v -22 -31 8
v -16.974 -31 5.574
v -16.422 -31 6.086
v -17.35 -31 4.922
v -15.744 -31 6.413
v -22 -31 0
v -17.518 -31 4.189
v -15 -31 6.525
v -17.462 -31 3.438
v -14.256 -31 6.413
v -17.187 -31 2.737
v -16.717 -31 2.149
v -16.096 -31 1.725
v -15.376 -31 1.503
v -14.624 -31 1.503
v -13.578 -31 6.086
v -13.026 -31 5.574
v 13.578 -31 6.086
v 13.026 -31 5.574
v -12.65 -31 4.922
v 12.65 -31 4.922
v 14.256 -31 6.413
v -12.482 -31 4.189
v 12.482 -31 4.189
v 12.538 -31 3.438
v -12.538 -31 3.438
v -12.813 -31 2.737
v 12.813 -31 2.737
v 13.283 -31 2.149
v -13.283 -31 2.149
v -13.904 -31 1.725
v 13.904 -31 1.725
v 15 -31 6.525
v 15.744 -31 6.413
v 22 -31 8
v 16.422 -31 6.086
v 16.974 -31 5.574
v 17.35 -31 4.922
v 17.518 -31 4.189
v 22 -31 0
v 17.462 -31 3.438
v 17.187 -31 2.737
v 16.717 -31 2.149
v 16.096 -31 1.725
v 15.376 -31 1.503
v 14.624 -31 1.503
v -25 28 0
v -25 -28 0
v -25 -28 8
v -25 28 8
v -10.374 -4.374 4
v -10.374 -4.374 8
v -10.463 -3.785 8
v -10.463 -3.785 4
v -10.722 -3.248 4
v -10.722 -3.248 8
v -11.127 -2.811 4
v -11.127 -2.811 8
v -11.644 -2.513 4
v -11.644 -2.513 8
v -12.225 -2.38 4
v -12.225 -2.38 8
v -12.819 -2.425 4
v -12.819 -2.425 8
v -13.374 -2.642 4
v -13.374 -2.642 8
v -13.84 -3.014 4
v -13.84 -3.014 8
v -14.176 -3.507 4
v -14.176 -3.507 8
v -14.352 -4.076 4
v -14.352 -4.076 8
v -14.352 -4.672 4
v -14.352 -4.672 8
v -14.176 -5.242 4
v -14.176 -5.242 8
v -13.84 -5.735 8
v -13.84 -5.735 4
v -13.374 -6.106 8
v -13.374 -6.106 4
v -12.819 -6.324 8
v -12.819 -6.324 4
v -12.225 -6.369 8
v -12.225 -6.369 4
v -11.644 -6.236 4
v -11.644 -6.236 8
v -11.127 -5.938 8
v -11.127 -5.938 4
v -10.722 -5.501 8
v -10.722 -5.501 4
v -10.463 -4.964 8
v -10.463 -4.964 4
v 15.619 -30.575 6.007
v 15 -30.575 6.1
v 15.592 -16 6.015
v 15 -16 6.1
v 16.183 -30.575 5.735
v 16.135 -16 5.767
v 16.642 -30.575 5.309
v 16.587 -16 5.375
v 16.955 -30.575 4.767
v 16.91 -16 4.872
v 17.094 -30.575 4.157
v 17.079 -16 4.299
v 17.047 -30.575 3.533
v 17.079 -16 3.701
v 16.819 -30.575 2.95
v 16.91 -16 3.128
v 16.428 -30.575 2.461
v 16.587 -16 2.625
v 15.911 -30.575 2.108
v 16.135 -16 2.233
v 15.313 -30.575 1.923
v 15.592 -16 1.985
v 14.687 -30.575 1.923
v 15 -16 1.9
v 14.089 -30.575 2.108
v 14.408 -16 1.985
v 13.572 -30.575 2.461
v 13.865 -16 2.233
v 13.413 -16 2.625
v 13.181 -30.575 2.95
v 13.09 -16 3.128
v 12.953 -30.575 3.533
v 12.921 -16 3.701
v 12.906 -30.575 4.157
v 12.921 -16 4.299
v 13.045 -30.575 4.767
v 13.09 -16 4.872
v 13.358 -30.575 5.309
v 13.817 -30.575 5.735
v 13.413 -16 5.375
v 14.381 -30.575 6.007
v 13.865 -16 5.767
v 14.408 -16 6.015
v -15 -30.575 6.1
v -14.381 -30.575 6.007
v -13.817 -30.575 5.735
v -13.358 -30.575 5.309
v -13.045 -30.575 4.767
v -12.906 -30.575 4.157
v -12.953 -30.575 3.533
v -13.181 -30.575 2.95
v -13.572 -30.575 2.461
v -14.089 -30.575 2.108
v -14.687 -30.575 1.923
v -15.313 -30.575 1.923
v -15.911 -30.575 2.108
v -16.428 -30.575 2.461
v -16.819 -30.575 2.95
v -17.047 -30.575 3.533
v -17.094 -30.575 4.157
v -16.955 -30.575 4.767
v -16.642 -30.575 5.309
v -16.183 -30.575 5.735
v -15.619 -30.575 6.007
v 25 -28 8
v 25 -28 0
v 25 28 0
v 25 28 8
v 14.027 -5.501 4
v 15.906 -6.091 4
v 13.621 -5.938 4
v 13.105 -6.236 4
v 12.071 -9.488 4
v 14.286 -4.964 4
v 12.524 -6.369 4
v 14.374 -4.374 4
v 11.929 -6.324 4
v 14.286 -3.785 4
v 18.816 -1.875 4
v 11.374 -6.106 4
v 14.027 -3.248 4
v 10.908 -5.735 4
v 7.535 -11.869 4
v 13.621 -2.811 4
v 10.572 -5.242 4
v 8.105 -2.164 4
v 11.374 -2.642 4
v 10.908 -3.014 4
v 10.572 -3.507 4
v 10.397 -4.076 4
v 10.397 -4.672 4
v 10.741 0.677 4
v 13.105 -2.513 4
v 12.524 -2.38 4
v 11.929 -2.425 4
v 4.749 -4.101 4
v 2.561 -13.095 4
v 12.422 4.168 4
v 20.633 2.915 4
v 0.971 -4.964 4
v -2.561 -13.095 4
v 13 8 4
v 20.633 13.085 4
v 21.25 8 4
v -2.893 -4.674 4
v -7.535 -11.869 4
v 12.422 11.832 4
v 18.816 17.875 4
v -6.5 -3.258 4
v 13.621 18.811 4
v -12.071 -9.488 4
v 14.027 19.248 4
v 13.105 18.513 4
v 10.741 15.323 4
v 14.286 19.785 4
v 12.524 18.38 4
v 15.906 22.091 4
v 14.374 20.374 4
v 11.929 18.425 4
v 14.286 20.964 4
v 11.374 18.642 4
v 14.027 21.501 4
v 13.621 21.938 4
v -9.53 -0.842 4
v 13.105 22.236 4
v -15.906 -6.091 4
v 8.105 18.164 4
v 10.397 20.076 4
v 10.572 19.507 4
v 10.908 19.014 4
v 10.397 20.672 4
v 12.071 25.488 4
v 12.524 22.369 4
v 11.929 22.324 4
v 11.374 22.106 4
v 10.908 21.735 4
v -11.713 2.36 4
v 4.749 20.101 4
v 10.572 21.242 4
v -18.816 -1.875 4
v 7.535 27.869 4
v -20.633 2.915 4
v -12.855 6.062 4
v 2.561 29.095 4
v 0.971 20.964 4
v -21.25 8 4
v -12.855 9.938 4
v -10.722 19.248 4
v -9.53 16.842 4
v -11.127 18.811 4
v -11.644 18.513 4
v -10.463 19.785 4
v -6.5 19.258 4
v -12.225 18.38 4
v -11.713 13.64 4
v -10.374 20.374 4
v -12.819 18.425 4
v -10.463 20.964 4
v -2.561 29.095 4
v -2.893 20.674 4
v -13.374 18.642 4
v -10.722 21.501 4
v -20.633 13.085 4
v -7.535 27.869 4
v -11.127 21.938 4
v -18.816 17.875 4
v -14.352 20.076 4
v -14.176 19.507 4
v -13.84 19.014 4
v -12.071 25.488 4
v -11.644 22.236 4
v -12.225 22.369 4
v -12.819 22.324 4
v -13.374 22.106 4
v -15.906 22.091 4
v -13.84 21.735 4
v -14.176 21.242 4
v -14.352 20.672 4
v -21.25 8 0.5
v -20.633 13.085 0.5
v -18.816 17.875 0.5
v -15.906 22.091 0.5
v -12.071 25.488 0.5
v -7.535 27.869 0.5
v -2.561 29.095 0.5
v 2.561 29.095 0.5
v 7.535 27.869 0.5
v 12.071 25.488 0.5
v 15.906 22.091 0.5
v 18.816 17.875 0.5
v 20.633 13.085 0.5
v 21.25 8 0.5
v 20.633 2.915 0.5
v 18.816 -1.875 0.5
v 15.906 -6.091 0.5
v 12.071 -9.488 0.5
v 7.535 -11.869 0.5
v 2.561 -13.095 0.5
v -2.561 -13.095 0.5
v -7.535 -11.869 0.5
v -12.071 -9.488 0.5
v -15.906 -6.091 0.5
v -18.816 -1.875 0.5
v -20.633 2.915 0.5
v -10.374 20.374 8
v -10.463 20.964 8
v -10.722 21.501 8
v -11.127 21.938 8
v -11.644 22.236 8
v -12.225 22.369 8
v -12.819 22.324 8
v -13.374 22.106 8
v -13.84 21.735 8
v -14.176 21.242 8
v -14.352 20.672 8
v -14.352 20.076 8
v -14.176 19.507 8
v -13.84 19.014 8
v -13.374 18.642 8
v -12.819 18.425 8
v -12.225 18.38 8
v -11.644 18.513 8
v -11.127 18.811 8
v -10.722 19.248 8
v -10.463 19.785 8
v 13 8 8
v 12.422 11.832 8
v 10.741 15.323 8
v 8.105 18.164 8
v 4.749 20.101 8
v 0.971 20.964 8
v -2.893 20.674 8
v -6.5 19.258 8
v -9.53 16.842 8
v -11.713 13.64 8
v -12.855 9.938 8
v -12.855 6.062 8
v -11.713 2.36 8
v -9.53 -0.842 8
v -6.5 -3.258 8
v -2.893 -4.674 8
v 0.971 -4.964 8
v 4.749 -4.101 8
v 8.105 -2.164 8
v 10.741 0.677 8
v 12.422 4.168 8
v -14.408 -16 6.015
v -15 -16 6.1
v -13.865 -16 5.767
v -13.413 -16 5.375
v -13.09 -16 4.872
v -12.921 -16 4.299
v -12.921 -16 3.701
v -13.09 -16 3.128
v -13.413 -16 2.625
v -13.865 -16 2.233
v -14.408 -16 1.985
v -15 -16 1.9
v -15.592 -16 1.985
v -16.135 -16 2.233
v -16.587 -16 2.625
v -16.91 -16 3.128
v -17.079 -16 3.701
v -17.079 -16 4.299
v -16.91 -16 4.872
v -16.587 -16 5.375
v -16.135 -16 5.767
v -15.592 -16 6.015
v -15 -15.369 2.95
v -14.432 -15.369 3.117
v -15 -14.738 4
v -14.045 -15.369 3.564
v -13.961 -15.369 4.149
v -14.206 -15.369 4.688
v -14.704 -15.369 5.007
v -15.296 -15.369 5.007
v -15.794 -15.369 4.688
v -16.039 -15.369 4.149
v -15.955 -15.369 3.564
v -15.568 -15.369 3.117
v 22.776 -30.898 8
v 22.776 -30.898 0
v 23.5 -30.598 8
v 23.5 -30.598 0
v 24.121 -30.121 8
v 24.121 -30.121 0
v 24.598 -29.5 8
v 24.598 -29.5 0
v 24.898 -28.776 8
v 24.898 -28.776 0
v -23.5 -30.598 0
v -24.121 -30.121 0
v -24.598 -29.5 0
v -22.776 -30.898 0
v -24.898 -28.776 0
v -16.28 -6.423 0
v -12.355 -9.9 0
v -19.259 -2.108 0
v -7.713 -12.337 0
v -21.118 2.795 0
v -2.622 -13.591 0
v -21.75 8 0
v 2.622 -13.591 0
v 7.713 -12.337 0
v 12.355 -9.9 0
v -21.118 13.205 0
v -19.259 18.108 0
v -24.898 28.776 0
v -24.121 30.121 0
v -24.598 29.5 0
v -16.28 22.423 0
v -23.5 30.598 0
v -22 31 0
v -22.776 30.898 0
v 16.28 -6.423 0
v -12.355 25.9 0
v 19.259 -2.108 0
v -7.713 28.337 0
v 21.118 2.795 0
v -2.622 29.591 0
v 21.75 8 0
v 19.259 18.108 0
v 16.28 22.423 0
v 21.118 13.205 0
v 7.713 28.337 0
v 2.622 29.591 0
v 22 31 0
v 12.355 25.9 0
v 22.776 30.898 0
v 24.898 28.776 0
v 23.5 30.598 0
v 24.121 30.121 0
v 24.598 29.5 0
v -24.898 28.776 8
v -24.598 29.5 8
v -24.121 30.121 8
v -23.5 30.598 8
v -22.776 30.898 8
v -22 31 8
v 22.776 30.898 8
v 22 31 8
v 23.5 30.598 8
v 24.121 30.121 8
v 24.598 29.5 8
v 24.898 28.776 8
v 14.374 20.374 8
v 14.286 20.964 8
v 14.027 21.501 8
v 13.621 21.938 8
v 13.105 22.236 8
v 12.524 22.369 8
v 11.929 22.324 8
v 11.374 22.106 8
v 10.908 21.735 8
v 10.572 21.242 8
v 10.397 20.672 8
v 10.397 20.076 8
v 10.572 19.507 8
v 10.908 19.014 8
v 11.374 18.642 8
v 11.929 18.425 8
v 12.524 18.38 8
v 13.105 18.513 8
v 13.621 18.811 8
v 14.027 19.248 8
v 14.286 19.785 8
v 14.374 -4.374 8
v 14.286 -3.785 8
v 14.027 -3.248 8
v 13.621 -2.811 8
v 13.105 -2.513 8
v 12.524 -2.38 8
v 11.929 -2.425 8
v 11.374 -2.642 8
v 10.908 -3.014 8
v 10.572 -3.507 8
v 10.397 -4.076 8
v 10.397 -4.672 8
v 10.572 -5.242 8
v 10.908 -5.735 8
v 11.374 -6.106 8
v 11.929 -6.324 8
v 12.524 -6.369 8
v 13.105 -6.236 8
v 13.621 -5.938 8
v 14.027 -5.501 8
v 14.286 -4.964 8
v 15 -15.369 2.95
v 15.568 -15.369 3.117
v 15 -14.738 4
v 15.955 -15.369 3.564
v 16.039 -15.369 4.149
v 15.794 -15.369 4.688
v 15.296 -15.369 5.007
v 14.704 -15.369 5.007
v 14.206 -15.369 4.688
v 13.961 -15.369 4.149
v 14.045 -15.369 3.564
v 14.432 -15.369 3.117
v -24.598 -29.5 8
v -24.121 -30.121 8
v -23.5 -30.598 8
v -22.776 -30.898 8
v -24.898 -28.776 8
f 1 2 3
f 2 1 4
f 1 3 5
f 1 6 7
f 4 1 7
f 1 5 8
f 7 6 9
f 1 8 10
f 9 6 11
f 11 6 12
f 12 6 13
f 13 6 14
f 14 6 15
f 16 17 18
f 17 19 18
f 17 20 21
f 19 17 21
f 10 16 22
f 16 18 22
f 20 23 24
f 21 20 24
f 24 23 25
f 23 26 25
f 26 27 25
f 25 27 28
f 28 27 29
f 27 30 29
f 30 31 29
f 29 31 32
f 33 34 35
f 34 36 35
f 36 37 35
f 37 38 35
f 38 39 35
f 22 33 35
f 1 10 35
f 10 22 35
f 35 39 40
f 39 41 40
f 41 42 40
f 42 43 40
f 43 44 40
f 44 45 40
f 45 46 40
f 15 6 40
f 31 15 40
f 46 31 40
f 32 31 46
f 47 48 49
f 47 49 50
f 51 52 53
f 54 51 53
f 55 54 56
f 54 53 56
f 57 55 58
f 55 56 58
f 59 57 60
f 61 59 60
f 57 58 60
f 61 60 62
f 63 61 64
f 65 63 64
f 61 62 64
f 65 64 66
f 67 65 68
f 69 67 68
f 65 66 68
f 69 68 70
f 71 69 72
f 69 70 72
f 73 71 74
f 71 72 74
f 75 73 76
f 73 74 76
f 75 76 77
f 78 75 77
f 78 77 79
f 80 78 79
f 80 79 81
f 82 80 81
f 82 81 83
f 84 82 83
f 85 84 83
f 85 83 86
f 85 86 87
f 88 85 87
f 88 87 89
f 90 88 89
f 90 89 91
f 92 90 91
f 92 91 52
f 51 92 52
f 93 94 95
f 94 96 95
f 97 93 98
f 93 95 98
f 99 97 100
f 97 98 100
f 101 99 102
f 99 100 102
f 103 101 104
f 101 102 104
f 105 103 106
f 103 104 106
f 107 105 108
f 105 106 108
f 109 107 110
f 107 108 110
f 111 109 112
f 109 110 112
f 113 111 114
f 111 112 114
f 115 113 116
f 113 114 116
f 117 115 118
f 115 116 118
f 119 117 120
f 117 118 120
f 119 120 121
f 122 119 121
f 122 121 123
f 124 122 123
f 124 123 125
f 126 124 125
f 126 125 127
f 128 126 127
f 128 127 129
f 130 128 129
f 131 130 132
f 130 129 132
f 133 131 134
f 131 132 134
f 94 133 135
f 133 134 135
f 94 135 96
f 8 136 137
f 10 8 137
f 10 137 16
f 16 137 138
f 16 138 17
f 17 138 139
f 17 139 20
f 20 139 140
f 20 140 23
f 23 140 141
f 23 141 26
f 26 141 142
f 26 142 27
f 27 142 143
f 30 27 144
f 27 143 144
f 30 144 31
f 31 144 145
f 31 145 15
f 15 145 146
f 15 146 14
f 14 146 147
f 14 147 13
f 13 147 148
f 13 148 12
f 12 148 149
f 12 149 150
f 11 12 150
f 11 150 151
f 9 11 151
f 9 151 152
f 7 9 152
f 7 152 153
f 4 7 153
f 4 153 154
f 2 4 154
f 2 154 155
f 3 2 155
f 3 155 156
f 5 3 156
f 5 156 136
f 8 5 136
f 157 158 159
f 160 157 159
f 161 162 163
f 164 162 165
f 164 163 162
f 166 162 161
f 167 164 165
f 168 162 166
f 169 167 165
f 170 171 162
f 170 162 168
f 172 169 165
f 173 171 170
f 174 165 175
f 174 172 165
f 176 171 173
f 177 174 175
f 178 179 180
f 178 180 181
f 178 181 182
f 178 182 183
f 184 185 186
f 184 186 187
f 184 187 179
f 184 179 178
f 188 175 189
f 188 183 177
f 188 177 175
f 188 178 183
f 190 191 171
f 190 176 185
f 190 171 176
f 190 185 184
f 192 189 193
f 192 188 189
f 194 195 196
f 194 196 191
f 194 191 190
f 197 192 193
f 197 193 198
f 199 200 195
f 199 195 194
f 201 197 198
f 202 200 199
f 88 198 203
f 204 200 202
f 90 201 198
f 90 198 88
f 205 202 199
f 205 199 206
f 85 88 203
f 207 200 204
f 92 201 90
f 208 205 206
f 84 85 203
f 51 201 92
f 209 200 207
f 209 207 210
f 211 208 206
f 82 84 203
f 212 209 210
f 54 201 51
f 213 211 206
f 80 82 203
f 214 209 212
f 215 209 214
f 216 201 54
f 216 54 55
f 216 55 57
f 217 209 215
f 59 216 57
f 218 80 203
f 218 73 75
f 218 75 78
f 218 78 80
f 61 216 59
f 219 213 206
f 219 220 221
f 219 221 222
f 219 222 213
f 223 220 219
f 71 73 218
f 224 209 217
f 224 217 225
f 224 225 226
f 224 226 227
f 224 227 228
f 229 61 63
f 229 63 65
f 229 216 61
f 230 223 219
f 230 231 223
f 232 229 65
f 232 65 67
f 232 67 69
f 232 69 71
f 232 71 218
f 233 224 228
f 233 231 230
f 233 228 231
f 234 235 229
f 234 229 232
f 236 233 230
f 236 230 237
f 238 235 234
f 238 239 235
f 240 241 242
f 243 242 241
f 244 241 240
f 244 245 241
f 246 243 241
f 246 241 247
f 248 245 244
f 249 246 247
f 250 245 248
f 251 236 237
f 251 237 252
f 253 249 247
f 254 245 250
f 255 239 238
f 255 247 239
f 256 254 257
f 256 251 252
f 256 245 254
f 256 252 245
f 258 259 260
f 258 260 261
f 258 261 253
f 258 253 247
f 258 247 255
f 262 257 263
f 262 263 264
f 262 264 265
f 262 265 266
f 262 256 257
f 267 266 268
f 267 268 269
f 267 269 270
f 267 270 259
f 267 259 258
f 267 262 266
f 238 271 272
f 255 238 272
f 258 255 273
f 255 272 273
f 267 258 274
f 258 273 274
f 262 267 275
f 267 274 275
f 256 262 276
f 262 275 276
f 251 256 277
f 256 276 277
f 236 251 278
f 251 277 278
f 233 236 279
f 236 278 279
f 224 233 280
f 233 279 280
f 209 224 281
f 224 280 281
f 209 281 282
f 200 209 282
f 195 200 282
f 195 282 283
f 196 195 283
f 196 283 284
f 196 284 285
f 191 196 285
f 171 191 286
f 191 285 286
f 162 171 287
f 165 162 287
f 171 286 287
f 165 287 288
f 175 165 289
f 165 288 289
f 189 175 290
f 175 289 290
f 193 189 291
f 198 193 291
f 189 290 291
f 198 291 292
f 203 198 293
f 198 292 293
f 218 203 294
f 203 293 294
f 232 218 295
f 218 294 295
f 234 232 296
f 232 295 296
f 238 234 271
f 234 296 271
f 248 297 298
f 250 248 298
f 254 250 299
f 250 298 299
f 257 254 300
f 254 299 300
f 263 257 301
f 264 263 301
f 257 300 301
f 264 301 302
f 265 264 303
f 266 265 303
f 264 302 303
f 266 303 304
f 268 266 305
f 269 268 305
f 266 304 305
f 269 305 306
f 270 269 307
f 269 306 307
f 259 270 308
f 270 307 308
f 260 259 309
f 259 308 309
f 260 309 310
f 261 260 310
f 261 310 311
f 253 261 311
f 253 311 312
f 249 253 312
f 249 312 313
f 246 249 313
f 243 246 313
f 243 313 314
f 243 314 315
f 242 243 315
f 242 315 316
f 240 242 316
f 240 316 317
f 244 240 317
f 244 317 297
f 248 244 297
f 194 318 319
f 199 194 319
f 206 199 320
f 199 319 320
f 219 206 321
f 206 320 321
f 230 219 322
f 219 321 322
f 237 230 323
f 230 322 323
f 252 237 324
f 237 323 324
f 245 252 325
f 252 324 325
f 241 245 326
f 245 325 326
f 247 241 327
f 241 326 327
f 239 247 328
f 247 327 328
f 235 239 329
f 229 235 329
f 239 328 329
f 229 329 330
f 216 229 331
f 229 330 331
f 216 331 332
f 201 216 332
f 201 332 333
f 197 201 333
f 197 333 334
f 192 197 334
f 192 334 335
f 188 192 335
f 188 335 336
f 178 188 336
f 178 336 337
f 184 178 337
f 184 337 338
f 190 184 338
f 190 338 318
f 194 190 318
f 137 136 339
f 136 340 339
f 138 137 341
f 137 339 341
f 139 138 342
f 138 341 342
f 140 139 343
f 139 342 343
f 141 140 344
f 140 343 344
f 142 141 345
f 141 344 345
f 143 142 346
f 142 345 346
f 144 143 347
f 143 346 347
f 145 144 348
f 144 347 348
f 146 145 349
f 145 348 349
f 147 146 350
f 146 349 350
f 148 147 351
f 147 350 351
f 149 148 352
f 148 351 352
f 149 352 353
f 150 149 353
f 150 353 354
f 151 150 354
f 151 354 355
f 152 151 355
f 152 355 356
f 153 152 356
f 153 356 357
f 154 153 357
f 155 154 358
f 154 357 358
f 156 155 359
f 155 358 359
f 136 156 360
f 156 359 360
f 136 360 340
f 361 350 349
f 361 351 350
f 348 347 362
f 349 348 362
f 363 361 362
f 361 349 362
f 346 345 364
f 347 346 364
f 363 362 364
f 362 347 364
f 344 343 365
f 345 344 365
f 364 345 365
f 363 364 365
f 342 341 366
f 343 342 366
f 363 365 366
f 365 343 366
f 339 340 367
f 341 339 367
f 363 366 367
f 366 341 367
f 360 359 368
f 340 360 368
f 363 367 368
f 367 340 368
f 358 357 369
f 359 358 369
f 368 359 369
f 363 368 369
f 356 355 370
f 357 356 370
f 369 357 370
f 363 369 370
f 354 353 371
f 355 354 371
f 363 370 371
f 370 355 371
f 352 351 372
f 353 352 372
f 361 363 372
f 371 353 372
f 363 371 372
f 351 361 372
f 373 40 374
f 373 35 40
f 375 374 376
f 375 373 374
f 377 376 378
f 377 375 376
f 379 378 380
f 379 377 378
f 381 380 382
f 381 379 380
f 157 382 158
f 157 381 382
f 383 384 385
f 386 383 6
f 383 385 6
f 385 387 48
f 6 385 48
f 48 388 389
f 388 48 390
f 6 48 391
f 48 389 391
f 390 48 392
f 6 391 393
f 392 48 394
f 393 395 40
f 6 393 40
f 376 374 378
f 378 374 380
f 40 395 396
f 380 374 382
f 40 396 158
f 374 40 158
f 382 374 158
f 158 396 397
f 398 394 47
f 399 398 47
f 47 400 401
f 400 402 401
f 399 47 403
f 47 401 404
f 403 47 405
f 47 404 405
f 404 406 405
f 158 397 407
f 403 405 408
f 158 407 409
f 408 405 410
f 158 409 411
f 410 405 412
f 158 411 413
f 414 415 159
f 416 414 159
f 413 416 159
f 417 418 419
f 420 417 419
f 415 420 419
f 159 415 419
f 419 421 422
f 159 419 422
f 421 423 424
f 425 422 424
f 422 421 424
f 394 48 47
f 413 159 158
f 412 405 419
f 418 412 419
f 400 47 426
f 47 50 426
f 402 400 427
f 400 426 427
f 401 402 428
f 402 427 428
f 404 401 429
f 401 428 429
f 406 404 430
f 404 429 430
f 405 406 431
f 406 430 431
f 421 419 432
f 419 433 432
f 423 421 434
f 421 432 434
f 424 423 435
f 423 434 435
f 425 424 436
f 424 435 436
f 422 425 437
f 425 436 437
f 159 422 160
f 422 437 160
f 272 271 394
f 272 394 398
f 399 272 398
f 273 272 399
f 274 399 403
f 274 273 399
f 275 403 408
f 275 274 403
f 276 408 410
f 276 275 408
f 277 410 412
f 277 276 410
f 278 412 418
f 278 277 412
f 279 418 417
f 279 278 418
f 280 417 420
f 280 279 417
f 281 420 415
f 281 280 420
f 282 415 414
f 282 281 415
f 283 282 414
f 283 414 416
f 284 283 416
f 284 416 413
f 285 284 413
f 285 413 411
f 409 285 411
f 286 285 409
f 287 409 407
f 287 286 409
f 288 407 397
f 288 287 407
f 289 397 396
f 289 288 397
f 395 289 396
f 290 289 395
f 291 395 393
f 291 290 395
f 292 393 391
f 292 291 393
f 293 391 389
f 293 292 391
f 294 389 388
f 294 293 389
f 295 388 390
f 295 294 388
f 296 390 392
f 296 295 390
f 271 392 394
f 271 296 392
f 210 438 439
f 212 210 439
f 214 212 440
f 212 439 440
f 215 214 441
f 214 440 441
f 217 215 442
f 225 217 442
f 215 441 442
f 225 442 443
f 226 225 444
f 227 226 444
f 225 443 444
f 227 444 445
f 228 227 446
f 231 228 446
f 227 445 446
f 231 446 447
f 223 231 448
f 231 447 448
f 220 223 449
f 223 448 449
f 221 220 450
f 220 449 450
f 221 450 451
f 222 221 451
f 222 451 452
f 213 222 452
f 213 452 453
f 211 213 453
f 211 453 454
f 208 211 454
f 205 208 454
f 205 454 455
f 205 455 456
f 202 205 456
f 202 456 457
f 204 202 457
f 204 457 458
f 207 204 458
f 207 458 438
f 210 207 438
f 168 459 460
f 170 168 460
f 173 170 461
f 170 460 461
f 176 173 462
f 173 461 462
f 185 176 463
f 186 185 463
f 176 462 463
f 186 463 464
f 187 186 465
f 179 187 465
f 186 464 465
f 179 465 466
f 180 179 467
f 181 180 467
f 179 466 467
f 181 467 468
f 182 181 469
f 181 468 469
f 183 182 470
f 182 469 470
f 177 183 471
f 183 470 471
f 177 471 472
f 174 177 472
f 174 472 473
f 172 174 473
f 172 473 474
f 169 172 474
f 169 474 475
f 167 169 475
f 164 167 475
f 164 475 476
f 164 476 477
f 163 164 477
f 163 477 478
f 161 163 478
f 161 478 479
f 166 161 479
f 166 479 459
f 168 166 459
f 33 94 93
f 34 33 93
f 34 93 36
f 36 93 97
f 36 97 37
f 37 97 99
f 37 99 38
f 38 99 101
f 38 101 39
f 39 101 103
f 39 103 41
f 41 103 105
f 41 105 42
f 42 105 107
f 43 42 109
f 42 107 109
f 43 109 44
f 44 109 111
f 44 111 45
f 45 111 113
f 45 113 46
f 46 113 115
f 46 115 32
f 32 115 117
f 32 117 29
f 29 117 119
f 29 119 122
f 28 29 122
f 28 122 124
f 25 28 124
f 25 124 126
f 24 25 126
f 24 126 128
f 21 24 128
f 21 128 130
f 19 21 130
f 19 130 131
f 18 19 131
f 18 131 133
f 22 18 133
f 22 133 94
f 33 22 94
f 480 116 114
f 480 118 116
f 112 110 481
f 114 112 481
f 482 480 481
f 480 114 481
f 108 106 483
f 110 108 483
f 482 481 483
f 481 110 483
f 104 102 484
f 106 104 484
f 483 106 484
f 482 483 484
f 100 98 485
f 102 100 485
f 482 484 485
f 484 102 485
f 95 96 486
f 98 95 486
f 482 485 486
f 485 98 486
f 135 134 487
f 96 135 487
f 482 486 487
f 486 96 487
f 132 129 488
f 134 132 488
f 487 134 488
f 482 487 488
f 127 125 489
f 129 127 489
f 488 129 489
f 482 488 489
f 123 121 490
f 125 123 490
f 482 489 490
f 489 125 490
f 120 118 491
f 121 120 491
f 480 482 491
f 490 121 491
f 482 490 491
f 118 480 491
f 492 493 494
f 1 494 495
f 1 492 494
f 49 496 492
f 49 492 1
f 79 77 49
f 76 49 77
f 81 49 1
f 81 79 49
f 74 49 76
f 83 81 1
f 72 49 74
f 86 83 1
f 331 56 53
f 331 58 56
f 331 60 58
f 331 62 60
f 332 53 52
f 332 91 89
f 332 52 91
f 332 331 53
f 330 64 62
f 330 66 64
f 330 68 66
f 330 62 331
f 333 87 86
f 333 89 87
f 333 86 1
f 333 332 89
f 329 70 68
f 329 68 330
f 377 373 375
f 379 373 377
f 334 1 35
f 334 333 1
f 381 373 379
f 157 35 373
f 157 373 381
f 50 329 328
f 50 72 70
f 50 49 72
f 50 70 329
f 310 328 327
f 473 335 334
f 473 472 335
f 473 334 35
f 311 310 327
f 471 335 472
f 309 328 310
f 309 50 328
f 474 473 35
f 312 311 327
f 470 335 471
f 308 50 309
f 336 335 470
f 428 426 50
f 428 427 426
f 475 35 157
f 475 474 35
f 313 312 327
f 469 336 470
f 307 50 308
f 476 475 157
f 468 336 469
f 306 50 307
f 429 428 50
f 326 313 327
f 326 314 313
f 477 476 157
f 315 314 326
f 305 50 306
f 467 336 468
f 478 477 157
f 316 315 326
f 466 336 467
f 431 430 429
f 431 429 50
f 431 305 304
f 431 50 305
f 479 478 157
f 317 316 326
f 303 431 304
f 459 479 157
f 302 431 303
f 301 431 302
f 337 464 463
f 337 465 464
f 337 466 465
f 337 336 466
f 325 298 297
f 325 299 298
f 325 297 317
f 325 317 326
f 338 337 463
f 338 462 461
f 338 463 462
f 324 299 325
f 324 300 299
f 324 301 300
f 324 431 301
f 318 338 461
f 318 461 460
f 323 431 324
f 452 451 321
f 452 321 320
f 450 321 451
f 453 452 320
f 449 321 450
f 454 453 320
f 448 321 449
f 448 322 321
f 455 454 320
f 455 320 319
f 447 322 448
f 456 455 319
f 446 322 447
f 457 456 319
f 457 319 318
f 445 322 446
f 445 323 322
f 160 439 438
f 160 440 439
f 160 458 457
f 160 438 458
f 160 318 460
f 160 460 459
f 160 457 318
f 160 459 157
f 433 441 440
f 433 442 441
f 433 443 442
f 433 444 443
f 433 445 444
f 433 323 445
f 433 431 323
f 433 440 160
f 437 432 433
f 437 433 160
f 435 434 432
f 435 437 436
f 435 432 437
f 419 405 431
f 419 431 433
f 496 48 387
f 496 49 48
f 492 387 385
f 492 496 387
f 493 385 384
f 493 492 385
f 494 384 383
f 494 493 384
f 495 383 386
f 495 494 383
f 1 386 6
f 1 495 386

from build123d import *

# Parameters (mm, degrees)
SKETCH_1_W                   = 50
SKETCH_1_H                   = 62
EXTRUDE_1_DEPTH              = 8
SKETCH_2_R                   = 13
SKETCH_2_R_2                 = 2
CUT_EXTRUDE_1_DEPTH          = 41.620192023
HOLE_WIZARD_M5_1_D           = 4.2
HOLE_WIZARD_M5_1_DEPTH       = 15
HOLE_WIZARD_M5_1_CSINK_D     = 5.05
HOLE_WIZARD_M5_1_CSINK_ANGLE = 90
HOLE_WIZARD_M5_1_TIP         = 1.2618073
FILLET_1_R                   = 3
SKETCH_6_R                   = 21.25
CUT_EXTRUDE_2_DEPTH          = 4
CHAMFER_1_SIZE               = 0.5


with BuildPart() as part:
    # 草图1 → 凸台-拉伸1 (new body)
    with BuildSketch(Plane.XY):
        Rectangle(SKETCH_1_W, SKETCH_1_H)
    extrude(amount=EXTRUDE_1_DEPTH)

    # 草图2 → 切除-拉伸1 (cut, through all)
    with BuildSketch(Plane.XY.offset(8)):
        with Locations((0, 8)):
            Circle(SKETCH_2_R)
        with Locations((12.374368671, 20.374368671)):
            Circle(SKETCH_2_R_2)
        with Locations((12.374368671, -4.374368671)):
            Circle(SKETCH_2_R_2)
        with Locations((-12.374368671, -4.374368671)):
            Circle(SKETCH_2_R_2)
        with Locations((-12.374368671, 20.374368671)):
            Circle(SKETCH_2_R_2)
    extrude(amount=-CUT_EXTRUDE_1_DEPTH, mode=Mode.SUBTRACT)

    # M5 螺纹孔1
    with Locations(Plane(origin=(-15, -31, 4), x_dir=(0, 0, -1), z_dir=(0, -1, 0))):
        with Locations((0, 0), (0, 30)):
            CounterSinkHole(HOLE_WIZARD_M5_1_D / 2, HOLE_WIZARD_M5_1_CSINK_D / 2, depth=HOLE_WIZARD_M5_1_DEPTH, counter_sink_angle=HOLE_WIZARD_M5_1_CSINK_ANGLE)
            with Locations((0, 0, -(HOLE_WIZARD_M5_1_DEPTH + HOLE_WIZARD_M5_1_TIP / 2))):  # 118° drill point
                Cone(0, HOLE_WIZARD_M5_1_D / 2, HOLE_WIZARD_M5_1_TIP, mode=Mode.SUBTRACT)

    # 圆角1
    fillet_1_edges = [part.edges().sort_by_distance(p)[0] for p in [
        (25, -31, 4),
        (-25, -31, 4),
        (-25, 31, 4),
        (25, 31, 4),
    ]]
    fillet(fillet_1_edges, radius=FILLET_1_R)

    # 草图6 → 切除-拉伸2 (cut)
    with BuildSketch(Plane(origin=(0, 0, 0), x_dir=(-1, 0, 0), z_dir=(0, 0, -1))):
        with Locations((0, 8)):
            Circle(SKETCH_6_R)
    extrude(amount=-CUT_EXTRUDE_2_DEPTH, mode=Mode.SUBTRACT)

    # 倒角1
    chamfer_1_edges = [part.edges().sort_by_distance(p)[0] for p in [
        (21.25, 8, 0),
    ]]
    chamfer(chamfer_1_edges, length=CHAMFER_1_SIZE)


solid = part.part
